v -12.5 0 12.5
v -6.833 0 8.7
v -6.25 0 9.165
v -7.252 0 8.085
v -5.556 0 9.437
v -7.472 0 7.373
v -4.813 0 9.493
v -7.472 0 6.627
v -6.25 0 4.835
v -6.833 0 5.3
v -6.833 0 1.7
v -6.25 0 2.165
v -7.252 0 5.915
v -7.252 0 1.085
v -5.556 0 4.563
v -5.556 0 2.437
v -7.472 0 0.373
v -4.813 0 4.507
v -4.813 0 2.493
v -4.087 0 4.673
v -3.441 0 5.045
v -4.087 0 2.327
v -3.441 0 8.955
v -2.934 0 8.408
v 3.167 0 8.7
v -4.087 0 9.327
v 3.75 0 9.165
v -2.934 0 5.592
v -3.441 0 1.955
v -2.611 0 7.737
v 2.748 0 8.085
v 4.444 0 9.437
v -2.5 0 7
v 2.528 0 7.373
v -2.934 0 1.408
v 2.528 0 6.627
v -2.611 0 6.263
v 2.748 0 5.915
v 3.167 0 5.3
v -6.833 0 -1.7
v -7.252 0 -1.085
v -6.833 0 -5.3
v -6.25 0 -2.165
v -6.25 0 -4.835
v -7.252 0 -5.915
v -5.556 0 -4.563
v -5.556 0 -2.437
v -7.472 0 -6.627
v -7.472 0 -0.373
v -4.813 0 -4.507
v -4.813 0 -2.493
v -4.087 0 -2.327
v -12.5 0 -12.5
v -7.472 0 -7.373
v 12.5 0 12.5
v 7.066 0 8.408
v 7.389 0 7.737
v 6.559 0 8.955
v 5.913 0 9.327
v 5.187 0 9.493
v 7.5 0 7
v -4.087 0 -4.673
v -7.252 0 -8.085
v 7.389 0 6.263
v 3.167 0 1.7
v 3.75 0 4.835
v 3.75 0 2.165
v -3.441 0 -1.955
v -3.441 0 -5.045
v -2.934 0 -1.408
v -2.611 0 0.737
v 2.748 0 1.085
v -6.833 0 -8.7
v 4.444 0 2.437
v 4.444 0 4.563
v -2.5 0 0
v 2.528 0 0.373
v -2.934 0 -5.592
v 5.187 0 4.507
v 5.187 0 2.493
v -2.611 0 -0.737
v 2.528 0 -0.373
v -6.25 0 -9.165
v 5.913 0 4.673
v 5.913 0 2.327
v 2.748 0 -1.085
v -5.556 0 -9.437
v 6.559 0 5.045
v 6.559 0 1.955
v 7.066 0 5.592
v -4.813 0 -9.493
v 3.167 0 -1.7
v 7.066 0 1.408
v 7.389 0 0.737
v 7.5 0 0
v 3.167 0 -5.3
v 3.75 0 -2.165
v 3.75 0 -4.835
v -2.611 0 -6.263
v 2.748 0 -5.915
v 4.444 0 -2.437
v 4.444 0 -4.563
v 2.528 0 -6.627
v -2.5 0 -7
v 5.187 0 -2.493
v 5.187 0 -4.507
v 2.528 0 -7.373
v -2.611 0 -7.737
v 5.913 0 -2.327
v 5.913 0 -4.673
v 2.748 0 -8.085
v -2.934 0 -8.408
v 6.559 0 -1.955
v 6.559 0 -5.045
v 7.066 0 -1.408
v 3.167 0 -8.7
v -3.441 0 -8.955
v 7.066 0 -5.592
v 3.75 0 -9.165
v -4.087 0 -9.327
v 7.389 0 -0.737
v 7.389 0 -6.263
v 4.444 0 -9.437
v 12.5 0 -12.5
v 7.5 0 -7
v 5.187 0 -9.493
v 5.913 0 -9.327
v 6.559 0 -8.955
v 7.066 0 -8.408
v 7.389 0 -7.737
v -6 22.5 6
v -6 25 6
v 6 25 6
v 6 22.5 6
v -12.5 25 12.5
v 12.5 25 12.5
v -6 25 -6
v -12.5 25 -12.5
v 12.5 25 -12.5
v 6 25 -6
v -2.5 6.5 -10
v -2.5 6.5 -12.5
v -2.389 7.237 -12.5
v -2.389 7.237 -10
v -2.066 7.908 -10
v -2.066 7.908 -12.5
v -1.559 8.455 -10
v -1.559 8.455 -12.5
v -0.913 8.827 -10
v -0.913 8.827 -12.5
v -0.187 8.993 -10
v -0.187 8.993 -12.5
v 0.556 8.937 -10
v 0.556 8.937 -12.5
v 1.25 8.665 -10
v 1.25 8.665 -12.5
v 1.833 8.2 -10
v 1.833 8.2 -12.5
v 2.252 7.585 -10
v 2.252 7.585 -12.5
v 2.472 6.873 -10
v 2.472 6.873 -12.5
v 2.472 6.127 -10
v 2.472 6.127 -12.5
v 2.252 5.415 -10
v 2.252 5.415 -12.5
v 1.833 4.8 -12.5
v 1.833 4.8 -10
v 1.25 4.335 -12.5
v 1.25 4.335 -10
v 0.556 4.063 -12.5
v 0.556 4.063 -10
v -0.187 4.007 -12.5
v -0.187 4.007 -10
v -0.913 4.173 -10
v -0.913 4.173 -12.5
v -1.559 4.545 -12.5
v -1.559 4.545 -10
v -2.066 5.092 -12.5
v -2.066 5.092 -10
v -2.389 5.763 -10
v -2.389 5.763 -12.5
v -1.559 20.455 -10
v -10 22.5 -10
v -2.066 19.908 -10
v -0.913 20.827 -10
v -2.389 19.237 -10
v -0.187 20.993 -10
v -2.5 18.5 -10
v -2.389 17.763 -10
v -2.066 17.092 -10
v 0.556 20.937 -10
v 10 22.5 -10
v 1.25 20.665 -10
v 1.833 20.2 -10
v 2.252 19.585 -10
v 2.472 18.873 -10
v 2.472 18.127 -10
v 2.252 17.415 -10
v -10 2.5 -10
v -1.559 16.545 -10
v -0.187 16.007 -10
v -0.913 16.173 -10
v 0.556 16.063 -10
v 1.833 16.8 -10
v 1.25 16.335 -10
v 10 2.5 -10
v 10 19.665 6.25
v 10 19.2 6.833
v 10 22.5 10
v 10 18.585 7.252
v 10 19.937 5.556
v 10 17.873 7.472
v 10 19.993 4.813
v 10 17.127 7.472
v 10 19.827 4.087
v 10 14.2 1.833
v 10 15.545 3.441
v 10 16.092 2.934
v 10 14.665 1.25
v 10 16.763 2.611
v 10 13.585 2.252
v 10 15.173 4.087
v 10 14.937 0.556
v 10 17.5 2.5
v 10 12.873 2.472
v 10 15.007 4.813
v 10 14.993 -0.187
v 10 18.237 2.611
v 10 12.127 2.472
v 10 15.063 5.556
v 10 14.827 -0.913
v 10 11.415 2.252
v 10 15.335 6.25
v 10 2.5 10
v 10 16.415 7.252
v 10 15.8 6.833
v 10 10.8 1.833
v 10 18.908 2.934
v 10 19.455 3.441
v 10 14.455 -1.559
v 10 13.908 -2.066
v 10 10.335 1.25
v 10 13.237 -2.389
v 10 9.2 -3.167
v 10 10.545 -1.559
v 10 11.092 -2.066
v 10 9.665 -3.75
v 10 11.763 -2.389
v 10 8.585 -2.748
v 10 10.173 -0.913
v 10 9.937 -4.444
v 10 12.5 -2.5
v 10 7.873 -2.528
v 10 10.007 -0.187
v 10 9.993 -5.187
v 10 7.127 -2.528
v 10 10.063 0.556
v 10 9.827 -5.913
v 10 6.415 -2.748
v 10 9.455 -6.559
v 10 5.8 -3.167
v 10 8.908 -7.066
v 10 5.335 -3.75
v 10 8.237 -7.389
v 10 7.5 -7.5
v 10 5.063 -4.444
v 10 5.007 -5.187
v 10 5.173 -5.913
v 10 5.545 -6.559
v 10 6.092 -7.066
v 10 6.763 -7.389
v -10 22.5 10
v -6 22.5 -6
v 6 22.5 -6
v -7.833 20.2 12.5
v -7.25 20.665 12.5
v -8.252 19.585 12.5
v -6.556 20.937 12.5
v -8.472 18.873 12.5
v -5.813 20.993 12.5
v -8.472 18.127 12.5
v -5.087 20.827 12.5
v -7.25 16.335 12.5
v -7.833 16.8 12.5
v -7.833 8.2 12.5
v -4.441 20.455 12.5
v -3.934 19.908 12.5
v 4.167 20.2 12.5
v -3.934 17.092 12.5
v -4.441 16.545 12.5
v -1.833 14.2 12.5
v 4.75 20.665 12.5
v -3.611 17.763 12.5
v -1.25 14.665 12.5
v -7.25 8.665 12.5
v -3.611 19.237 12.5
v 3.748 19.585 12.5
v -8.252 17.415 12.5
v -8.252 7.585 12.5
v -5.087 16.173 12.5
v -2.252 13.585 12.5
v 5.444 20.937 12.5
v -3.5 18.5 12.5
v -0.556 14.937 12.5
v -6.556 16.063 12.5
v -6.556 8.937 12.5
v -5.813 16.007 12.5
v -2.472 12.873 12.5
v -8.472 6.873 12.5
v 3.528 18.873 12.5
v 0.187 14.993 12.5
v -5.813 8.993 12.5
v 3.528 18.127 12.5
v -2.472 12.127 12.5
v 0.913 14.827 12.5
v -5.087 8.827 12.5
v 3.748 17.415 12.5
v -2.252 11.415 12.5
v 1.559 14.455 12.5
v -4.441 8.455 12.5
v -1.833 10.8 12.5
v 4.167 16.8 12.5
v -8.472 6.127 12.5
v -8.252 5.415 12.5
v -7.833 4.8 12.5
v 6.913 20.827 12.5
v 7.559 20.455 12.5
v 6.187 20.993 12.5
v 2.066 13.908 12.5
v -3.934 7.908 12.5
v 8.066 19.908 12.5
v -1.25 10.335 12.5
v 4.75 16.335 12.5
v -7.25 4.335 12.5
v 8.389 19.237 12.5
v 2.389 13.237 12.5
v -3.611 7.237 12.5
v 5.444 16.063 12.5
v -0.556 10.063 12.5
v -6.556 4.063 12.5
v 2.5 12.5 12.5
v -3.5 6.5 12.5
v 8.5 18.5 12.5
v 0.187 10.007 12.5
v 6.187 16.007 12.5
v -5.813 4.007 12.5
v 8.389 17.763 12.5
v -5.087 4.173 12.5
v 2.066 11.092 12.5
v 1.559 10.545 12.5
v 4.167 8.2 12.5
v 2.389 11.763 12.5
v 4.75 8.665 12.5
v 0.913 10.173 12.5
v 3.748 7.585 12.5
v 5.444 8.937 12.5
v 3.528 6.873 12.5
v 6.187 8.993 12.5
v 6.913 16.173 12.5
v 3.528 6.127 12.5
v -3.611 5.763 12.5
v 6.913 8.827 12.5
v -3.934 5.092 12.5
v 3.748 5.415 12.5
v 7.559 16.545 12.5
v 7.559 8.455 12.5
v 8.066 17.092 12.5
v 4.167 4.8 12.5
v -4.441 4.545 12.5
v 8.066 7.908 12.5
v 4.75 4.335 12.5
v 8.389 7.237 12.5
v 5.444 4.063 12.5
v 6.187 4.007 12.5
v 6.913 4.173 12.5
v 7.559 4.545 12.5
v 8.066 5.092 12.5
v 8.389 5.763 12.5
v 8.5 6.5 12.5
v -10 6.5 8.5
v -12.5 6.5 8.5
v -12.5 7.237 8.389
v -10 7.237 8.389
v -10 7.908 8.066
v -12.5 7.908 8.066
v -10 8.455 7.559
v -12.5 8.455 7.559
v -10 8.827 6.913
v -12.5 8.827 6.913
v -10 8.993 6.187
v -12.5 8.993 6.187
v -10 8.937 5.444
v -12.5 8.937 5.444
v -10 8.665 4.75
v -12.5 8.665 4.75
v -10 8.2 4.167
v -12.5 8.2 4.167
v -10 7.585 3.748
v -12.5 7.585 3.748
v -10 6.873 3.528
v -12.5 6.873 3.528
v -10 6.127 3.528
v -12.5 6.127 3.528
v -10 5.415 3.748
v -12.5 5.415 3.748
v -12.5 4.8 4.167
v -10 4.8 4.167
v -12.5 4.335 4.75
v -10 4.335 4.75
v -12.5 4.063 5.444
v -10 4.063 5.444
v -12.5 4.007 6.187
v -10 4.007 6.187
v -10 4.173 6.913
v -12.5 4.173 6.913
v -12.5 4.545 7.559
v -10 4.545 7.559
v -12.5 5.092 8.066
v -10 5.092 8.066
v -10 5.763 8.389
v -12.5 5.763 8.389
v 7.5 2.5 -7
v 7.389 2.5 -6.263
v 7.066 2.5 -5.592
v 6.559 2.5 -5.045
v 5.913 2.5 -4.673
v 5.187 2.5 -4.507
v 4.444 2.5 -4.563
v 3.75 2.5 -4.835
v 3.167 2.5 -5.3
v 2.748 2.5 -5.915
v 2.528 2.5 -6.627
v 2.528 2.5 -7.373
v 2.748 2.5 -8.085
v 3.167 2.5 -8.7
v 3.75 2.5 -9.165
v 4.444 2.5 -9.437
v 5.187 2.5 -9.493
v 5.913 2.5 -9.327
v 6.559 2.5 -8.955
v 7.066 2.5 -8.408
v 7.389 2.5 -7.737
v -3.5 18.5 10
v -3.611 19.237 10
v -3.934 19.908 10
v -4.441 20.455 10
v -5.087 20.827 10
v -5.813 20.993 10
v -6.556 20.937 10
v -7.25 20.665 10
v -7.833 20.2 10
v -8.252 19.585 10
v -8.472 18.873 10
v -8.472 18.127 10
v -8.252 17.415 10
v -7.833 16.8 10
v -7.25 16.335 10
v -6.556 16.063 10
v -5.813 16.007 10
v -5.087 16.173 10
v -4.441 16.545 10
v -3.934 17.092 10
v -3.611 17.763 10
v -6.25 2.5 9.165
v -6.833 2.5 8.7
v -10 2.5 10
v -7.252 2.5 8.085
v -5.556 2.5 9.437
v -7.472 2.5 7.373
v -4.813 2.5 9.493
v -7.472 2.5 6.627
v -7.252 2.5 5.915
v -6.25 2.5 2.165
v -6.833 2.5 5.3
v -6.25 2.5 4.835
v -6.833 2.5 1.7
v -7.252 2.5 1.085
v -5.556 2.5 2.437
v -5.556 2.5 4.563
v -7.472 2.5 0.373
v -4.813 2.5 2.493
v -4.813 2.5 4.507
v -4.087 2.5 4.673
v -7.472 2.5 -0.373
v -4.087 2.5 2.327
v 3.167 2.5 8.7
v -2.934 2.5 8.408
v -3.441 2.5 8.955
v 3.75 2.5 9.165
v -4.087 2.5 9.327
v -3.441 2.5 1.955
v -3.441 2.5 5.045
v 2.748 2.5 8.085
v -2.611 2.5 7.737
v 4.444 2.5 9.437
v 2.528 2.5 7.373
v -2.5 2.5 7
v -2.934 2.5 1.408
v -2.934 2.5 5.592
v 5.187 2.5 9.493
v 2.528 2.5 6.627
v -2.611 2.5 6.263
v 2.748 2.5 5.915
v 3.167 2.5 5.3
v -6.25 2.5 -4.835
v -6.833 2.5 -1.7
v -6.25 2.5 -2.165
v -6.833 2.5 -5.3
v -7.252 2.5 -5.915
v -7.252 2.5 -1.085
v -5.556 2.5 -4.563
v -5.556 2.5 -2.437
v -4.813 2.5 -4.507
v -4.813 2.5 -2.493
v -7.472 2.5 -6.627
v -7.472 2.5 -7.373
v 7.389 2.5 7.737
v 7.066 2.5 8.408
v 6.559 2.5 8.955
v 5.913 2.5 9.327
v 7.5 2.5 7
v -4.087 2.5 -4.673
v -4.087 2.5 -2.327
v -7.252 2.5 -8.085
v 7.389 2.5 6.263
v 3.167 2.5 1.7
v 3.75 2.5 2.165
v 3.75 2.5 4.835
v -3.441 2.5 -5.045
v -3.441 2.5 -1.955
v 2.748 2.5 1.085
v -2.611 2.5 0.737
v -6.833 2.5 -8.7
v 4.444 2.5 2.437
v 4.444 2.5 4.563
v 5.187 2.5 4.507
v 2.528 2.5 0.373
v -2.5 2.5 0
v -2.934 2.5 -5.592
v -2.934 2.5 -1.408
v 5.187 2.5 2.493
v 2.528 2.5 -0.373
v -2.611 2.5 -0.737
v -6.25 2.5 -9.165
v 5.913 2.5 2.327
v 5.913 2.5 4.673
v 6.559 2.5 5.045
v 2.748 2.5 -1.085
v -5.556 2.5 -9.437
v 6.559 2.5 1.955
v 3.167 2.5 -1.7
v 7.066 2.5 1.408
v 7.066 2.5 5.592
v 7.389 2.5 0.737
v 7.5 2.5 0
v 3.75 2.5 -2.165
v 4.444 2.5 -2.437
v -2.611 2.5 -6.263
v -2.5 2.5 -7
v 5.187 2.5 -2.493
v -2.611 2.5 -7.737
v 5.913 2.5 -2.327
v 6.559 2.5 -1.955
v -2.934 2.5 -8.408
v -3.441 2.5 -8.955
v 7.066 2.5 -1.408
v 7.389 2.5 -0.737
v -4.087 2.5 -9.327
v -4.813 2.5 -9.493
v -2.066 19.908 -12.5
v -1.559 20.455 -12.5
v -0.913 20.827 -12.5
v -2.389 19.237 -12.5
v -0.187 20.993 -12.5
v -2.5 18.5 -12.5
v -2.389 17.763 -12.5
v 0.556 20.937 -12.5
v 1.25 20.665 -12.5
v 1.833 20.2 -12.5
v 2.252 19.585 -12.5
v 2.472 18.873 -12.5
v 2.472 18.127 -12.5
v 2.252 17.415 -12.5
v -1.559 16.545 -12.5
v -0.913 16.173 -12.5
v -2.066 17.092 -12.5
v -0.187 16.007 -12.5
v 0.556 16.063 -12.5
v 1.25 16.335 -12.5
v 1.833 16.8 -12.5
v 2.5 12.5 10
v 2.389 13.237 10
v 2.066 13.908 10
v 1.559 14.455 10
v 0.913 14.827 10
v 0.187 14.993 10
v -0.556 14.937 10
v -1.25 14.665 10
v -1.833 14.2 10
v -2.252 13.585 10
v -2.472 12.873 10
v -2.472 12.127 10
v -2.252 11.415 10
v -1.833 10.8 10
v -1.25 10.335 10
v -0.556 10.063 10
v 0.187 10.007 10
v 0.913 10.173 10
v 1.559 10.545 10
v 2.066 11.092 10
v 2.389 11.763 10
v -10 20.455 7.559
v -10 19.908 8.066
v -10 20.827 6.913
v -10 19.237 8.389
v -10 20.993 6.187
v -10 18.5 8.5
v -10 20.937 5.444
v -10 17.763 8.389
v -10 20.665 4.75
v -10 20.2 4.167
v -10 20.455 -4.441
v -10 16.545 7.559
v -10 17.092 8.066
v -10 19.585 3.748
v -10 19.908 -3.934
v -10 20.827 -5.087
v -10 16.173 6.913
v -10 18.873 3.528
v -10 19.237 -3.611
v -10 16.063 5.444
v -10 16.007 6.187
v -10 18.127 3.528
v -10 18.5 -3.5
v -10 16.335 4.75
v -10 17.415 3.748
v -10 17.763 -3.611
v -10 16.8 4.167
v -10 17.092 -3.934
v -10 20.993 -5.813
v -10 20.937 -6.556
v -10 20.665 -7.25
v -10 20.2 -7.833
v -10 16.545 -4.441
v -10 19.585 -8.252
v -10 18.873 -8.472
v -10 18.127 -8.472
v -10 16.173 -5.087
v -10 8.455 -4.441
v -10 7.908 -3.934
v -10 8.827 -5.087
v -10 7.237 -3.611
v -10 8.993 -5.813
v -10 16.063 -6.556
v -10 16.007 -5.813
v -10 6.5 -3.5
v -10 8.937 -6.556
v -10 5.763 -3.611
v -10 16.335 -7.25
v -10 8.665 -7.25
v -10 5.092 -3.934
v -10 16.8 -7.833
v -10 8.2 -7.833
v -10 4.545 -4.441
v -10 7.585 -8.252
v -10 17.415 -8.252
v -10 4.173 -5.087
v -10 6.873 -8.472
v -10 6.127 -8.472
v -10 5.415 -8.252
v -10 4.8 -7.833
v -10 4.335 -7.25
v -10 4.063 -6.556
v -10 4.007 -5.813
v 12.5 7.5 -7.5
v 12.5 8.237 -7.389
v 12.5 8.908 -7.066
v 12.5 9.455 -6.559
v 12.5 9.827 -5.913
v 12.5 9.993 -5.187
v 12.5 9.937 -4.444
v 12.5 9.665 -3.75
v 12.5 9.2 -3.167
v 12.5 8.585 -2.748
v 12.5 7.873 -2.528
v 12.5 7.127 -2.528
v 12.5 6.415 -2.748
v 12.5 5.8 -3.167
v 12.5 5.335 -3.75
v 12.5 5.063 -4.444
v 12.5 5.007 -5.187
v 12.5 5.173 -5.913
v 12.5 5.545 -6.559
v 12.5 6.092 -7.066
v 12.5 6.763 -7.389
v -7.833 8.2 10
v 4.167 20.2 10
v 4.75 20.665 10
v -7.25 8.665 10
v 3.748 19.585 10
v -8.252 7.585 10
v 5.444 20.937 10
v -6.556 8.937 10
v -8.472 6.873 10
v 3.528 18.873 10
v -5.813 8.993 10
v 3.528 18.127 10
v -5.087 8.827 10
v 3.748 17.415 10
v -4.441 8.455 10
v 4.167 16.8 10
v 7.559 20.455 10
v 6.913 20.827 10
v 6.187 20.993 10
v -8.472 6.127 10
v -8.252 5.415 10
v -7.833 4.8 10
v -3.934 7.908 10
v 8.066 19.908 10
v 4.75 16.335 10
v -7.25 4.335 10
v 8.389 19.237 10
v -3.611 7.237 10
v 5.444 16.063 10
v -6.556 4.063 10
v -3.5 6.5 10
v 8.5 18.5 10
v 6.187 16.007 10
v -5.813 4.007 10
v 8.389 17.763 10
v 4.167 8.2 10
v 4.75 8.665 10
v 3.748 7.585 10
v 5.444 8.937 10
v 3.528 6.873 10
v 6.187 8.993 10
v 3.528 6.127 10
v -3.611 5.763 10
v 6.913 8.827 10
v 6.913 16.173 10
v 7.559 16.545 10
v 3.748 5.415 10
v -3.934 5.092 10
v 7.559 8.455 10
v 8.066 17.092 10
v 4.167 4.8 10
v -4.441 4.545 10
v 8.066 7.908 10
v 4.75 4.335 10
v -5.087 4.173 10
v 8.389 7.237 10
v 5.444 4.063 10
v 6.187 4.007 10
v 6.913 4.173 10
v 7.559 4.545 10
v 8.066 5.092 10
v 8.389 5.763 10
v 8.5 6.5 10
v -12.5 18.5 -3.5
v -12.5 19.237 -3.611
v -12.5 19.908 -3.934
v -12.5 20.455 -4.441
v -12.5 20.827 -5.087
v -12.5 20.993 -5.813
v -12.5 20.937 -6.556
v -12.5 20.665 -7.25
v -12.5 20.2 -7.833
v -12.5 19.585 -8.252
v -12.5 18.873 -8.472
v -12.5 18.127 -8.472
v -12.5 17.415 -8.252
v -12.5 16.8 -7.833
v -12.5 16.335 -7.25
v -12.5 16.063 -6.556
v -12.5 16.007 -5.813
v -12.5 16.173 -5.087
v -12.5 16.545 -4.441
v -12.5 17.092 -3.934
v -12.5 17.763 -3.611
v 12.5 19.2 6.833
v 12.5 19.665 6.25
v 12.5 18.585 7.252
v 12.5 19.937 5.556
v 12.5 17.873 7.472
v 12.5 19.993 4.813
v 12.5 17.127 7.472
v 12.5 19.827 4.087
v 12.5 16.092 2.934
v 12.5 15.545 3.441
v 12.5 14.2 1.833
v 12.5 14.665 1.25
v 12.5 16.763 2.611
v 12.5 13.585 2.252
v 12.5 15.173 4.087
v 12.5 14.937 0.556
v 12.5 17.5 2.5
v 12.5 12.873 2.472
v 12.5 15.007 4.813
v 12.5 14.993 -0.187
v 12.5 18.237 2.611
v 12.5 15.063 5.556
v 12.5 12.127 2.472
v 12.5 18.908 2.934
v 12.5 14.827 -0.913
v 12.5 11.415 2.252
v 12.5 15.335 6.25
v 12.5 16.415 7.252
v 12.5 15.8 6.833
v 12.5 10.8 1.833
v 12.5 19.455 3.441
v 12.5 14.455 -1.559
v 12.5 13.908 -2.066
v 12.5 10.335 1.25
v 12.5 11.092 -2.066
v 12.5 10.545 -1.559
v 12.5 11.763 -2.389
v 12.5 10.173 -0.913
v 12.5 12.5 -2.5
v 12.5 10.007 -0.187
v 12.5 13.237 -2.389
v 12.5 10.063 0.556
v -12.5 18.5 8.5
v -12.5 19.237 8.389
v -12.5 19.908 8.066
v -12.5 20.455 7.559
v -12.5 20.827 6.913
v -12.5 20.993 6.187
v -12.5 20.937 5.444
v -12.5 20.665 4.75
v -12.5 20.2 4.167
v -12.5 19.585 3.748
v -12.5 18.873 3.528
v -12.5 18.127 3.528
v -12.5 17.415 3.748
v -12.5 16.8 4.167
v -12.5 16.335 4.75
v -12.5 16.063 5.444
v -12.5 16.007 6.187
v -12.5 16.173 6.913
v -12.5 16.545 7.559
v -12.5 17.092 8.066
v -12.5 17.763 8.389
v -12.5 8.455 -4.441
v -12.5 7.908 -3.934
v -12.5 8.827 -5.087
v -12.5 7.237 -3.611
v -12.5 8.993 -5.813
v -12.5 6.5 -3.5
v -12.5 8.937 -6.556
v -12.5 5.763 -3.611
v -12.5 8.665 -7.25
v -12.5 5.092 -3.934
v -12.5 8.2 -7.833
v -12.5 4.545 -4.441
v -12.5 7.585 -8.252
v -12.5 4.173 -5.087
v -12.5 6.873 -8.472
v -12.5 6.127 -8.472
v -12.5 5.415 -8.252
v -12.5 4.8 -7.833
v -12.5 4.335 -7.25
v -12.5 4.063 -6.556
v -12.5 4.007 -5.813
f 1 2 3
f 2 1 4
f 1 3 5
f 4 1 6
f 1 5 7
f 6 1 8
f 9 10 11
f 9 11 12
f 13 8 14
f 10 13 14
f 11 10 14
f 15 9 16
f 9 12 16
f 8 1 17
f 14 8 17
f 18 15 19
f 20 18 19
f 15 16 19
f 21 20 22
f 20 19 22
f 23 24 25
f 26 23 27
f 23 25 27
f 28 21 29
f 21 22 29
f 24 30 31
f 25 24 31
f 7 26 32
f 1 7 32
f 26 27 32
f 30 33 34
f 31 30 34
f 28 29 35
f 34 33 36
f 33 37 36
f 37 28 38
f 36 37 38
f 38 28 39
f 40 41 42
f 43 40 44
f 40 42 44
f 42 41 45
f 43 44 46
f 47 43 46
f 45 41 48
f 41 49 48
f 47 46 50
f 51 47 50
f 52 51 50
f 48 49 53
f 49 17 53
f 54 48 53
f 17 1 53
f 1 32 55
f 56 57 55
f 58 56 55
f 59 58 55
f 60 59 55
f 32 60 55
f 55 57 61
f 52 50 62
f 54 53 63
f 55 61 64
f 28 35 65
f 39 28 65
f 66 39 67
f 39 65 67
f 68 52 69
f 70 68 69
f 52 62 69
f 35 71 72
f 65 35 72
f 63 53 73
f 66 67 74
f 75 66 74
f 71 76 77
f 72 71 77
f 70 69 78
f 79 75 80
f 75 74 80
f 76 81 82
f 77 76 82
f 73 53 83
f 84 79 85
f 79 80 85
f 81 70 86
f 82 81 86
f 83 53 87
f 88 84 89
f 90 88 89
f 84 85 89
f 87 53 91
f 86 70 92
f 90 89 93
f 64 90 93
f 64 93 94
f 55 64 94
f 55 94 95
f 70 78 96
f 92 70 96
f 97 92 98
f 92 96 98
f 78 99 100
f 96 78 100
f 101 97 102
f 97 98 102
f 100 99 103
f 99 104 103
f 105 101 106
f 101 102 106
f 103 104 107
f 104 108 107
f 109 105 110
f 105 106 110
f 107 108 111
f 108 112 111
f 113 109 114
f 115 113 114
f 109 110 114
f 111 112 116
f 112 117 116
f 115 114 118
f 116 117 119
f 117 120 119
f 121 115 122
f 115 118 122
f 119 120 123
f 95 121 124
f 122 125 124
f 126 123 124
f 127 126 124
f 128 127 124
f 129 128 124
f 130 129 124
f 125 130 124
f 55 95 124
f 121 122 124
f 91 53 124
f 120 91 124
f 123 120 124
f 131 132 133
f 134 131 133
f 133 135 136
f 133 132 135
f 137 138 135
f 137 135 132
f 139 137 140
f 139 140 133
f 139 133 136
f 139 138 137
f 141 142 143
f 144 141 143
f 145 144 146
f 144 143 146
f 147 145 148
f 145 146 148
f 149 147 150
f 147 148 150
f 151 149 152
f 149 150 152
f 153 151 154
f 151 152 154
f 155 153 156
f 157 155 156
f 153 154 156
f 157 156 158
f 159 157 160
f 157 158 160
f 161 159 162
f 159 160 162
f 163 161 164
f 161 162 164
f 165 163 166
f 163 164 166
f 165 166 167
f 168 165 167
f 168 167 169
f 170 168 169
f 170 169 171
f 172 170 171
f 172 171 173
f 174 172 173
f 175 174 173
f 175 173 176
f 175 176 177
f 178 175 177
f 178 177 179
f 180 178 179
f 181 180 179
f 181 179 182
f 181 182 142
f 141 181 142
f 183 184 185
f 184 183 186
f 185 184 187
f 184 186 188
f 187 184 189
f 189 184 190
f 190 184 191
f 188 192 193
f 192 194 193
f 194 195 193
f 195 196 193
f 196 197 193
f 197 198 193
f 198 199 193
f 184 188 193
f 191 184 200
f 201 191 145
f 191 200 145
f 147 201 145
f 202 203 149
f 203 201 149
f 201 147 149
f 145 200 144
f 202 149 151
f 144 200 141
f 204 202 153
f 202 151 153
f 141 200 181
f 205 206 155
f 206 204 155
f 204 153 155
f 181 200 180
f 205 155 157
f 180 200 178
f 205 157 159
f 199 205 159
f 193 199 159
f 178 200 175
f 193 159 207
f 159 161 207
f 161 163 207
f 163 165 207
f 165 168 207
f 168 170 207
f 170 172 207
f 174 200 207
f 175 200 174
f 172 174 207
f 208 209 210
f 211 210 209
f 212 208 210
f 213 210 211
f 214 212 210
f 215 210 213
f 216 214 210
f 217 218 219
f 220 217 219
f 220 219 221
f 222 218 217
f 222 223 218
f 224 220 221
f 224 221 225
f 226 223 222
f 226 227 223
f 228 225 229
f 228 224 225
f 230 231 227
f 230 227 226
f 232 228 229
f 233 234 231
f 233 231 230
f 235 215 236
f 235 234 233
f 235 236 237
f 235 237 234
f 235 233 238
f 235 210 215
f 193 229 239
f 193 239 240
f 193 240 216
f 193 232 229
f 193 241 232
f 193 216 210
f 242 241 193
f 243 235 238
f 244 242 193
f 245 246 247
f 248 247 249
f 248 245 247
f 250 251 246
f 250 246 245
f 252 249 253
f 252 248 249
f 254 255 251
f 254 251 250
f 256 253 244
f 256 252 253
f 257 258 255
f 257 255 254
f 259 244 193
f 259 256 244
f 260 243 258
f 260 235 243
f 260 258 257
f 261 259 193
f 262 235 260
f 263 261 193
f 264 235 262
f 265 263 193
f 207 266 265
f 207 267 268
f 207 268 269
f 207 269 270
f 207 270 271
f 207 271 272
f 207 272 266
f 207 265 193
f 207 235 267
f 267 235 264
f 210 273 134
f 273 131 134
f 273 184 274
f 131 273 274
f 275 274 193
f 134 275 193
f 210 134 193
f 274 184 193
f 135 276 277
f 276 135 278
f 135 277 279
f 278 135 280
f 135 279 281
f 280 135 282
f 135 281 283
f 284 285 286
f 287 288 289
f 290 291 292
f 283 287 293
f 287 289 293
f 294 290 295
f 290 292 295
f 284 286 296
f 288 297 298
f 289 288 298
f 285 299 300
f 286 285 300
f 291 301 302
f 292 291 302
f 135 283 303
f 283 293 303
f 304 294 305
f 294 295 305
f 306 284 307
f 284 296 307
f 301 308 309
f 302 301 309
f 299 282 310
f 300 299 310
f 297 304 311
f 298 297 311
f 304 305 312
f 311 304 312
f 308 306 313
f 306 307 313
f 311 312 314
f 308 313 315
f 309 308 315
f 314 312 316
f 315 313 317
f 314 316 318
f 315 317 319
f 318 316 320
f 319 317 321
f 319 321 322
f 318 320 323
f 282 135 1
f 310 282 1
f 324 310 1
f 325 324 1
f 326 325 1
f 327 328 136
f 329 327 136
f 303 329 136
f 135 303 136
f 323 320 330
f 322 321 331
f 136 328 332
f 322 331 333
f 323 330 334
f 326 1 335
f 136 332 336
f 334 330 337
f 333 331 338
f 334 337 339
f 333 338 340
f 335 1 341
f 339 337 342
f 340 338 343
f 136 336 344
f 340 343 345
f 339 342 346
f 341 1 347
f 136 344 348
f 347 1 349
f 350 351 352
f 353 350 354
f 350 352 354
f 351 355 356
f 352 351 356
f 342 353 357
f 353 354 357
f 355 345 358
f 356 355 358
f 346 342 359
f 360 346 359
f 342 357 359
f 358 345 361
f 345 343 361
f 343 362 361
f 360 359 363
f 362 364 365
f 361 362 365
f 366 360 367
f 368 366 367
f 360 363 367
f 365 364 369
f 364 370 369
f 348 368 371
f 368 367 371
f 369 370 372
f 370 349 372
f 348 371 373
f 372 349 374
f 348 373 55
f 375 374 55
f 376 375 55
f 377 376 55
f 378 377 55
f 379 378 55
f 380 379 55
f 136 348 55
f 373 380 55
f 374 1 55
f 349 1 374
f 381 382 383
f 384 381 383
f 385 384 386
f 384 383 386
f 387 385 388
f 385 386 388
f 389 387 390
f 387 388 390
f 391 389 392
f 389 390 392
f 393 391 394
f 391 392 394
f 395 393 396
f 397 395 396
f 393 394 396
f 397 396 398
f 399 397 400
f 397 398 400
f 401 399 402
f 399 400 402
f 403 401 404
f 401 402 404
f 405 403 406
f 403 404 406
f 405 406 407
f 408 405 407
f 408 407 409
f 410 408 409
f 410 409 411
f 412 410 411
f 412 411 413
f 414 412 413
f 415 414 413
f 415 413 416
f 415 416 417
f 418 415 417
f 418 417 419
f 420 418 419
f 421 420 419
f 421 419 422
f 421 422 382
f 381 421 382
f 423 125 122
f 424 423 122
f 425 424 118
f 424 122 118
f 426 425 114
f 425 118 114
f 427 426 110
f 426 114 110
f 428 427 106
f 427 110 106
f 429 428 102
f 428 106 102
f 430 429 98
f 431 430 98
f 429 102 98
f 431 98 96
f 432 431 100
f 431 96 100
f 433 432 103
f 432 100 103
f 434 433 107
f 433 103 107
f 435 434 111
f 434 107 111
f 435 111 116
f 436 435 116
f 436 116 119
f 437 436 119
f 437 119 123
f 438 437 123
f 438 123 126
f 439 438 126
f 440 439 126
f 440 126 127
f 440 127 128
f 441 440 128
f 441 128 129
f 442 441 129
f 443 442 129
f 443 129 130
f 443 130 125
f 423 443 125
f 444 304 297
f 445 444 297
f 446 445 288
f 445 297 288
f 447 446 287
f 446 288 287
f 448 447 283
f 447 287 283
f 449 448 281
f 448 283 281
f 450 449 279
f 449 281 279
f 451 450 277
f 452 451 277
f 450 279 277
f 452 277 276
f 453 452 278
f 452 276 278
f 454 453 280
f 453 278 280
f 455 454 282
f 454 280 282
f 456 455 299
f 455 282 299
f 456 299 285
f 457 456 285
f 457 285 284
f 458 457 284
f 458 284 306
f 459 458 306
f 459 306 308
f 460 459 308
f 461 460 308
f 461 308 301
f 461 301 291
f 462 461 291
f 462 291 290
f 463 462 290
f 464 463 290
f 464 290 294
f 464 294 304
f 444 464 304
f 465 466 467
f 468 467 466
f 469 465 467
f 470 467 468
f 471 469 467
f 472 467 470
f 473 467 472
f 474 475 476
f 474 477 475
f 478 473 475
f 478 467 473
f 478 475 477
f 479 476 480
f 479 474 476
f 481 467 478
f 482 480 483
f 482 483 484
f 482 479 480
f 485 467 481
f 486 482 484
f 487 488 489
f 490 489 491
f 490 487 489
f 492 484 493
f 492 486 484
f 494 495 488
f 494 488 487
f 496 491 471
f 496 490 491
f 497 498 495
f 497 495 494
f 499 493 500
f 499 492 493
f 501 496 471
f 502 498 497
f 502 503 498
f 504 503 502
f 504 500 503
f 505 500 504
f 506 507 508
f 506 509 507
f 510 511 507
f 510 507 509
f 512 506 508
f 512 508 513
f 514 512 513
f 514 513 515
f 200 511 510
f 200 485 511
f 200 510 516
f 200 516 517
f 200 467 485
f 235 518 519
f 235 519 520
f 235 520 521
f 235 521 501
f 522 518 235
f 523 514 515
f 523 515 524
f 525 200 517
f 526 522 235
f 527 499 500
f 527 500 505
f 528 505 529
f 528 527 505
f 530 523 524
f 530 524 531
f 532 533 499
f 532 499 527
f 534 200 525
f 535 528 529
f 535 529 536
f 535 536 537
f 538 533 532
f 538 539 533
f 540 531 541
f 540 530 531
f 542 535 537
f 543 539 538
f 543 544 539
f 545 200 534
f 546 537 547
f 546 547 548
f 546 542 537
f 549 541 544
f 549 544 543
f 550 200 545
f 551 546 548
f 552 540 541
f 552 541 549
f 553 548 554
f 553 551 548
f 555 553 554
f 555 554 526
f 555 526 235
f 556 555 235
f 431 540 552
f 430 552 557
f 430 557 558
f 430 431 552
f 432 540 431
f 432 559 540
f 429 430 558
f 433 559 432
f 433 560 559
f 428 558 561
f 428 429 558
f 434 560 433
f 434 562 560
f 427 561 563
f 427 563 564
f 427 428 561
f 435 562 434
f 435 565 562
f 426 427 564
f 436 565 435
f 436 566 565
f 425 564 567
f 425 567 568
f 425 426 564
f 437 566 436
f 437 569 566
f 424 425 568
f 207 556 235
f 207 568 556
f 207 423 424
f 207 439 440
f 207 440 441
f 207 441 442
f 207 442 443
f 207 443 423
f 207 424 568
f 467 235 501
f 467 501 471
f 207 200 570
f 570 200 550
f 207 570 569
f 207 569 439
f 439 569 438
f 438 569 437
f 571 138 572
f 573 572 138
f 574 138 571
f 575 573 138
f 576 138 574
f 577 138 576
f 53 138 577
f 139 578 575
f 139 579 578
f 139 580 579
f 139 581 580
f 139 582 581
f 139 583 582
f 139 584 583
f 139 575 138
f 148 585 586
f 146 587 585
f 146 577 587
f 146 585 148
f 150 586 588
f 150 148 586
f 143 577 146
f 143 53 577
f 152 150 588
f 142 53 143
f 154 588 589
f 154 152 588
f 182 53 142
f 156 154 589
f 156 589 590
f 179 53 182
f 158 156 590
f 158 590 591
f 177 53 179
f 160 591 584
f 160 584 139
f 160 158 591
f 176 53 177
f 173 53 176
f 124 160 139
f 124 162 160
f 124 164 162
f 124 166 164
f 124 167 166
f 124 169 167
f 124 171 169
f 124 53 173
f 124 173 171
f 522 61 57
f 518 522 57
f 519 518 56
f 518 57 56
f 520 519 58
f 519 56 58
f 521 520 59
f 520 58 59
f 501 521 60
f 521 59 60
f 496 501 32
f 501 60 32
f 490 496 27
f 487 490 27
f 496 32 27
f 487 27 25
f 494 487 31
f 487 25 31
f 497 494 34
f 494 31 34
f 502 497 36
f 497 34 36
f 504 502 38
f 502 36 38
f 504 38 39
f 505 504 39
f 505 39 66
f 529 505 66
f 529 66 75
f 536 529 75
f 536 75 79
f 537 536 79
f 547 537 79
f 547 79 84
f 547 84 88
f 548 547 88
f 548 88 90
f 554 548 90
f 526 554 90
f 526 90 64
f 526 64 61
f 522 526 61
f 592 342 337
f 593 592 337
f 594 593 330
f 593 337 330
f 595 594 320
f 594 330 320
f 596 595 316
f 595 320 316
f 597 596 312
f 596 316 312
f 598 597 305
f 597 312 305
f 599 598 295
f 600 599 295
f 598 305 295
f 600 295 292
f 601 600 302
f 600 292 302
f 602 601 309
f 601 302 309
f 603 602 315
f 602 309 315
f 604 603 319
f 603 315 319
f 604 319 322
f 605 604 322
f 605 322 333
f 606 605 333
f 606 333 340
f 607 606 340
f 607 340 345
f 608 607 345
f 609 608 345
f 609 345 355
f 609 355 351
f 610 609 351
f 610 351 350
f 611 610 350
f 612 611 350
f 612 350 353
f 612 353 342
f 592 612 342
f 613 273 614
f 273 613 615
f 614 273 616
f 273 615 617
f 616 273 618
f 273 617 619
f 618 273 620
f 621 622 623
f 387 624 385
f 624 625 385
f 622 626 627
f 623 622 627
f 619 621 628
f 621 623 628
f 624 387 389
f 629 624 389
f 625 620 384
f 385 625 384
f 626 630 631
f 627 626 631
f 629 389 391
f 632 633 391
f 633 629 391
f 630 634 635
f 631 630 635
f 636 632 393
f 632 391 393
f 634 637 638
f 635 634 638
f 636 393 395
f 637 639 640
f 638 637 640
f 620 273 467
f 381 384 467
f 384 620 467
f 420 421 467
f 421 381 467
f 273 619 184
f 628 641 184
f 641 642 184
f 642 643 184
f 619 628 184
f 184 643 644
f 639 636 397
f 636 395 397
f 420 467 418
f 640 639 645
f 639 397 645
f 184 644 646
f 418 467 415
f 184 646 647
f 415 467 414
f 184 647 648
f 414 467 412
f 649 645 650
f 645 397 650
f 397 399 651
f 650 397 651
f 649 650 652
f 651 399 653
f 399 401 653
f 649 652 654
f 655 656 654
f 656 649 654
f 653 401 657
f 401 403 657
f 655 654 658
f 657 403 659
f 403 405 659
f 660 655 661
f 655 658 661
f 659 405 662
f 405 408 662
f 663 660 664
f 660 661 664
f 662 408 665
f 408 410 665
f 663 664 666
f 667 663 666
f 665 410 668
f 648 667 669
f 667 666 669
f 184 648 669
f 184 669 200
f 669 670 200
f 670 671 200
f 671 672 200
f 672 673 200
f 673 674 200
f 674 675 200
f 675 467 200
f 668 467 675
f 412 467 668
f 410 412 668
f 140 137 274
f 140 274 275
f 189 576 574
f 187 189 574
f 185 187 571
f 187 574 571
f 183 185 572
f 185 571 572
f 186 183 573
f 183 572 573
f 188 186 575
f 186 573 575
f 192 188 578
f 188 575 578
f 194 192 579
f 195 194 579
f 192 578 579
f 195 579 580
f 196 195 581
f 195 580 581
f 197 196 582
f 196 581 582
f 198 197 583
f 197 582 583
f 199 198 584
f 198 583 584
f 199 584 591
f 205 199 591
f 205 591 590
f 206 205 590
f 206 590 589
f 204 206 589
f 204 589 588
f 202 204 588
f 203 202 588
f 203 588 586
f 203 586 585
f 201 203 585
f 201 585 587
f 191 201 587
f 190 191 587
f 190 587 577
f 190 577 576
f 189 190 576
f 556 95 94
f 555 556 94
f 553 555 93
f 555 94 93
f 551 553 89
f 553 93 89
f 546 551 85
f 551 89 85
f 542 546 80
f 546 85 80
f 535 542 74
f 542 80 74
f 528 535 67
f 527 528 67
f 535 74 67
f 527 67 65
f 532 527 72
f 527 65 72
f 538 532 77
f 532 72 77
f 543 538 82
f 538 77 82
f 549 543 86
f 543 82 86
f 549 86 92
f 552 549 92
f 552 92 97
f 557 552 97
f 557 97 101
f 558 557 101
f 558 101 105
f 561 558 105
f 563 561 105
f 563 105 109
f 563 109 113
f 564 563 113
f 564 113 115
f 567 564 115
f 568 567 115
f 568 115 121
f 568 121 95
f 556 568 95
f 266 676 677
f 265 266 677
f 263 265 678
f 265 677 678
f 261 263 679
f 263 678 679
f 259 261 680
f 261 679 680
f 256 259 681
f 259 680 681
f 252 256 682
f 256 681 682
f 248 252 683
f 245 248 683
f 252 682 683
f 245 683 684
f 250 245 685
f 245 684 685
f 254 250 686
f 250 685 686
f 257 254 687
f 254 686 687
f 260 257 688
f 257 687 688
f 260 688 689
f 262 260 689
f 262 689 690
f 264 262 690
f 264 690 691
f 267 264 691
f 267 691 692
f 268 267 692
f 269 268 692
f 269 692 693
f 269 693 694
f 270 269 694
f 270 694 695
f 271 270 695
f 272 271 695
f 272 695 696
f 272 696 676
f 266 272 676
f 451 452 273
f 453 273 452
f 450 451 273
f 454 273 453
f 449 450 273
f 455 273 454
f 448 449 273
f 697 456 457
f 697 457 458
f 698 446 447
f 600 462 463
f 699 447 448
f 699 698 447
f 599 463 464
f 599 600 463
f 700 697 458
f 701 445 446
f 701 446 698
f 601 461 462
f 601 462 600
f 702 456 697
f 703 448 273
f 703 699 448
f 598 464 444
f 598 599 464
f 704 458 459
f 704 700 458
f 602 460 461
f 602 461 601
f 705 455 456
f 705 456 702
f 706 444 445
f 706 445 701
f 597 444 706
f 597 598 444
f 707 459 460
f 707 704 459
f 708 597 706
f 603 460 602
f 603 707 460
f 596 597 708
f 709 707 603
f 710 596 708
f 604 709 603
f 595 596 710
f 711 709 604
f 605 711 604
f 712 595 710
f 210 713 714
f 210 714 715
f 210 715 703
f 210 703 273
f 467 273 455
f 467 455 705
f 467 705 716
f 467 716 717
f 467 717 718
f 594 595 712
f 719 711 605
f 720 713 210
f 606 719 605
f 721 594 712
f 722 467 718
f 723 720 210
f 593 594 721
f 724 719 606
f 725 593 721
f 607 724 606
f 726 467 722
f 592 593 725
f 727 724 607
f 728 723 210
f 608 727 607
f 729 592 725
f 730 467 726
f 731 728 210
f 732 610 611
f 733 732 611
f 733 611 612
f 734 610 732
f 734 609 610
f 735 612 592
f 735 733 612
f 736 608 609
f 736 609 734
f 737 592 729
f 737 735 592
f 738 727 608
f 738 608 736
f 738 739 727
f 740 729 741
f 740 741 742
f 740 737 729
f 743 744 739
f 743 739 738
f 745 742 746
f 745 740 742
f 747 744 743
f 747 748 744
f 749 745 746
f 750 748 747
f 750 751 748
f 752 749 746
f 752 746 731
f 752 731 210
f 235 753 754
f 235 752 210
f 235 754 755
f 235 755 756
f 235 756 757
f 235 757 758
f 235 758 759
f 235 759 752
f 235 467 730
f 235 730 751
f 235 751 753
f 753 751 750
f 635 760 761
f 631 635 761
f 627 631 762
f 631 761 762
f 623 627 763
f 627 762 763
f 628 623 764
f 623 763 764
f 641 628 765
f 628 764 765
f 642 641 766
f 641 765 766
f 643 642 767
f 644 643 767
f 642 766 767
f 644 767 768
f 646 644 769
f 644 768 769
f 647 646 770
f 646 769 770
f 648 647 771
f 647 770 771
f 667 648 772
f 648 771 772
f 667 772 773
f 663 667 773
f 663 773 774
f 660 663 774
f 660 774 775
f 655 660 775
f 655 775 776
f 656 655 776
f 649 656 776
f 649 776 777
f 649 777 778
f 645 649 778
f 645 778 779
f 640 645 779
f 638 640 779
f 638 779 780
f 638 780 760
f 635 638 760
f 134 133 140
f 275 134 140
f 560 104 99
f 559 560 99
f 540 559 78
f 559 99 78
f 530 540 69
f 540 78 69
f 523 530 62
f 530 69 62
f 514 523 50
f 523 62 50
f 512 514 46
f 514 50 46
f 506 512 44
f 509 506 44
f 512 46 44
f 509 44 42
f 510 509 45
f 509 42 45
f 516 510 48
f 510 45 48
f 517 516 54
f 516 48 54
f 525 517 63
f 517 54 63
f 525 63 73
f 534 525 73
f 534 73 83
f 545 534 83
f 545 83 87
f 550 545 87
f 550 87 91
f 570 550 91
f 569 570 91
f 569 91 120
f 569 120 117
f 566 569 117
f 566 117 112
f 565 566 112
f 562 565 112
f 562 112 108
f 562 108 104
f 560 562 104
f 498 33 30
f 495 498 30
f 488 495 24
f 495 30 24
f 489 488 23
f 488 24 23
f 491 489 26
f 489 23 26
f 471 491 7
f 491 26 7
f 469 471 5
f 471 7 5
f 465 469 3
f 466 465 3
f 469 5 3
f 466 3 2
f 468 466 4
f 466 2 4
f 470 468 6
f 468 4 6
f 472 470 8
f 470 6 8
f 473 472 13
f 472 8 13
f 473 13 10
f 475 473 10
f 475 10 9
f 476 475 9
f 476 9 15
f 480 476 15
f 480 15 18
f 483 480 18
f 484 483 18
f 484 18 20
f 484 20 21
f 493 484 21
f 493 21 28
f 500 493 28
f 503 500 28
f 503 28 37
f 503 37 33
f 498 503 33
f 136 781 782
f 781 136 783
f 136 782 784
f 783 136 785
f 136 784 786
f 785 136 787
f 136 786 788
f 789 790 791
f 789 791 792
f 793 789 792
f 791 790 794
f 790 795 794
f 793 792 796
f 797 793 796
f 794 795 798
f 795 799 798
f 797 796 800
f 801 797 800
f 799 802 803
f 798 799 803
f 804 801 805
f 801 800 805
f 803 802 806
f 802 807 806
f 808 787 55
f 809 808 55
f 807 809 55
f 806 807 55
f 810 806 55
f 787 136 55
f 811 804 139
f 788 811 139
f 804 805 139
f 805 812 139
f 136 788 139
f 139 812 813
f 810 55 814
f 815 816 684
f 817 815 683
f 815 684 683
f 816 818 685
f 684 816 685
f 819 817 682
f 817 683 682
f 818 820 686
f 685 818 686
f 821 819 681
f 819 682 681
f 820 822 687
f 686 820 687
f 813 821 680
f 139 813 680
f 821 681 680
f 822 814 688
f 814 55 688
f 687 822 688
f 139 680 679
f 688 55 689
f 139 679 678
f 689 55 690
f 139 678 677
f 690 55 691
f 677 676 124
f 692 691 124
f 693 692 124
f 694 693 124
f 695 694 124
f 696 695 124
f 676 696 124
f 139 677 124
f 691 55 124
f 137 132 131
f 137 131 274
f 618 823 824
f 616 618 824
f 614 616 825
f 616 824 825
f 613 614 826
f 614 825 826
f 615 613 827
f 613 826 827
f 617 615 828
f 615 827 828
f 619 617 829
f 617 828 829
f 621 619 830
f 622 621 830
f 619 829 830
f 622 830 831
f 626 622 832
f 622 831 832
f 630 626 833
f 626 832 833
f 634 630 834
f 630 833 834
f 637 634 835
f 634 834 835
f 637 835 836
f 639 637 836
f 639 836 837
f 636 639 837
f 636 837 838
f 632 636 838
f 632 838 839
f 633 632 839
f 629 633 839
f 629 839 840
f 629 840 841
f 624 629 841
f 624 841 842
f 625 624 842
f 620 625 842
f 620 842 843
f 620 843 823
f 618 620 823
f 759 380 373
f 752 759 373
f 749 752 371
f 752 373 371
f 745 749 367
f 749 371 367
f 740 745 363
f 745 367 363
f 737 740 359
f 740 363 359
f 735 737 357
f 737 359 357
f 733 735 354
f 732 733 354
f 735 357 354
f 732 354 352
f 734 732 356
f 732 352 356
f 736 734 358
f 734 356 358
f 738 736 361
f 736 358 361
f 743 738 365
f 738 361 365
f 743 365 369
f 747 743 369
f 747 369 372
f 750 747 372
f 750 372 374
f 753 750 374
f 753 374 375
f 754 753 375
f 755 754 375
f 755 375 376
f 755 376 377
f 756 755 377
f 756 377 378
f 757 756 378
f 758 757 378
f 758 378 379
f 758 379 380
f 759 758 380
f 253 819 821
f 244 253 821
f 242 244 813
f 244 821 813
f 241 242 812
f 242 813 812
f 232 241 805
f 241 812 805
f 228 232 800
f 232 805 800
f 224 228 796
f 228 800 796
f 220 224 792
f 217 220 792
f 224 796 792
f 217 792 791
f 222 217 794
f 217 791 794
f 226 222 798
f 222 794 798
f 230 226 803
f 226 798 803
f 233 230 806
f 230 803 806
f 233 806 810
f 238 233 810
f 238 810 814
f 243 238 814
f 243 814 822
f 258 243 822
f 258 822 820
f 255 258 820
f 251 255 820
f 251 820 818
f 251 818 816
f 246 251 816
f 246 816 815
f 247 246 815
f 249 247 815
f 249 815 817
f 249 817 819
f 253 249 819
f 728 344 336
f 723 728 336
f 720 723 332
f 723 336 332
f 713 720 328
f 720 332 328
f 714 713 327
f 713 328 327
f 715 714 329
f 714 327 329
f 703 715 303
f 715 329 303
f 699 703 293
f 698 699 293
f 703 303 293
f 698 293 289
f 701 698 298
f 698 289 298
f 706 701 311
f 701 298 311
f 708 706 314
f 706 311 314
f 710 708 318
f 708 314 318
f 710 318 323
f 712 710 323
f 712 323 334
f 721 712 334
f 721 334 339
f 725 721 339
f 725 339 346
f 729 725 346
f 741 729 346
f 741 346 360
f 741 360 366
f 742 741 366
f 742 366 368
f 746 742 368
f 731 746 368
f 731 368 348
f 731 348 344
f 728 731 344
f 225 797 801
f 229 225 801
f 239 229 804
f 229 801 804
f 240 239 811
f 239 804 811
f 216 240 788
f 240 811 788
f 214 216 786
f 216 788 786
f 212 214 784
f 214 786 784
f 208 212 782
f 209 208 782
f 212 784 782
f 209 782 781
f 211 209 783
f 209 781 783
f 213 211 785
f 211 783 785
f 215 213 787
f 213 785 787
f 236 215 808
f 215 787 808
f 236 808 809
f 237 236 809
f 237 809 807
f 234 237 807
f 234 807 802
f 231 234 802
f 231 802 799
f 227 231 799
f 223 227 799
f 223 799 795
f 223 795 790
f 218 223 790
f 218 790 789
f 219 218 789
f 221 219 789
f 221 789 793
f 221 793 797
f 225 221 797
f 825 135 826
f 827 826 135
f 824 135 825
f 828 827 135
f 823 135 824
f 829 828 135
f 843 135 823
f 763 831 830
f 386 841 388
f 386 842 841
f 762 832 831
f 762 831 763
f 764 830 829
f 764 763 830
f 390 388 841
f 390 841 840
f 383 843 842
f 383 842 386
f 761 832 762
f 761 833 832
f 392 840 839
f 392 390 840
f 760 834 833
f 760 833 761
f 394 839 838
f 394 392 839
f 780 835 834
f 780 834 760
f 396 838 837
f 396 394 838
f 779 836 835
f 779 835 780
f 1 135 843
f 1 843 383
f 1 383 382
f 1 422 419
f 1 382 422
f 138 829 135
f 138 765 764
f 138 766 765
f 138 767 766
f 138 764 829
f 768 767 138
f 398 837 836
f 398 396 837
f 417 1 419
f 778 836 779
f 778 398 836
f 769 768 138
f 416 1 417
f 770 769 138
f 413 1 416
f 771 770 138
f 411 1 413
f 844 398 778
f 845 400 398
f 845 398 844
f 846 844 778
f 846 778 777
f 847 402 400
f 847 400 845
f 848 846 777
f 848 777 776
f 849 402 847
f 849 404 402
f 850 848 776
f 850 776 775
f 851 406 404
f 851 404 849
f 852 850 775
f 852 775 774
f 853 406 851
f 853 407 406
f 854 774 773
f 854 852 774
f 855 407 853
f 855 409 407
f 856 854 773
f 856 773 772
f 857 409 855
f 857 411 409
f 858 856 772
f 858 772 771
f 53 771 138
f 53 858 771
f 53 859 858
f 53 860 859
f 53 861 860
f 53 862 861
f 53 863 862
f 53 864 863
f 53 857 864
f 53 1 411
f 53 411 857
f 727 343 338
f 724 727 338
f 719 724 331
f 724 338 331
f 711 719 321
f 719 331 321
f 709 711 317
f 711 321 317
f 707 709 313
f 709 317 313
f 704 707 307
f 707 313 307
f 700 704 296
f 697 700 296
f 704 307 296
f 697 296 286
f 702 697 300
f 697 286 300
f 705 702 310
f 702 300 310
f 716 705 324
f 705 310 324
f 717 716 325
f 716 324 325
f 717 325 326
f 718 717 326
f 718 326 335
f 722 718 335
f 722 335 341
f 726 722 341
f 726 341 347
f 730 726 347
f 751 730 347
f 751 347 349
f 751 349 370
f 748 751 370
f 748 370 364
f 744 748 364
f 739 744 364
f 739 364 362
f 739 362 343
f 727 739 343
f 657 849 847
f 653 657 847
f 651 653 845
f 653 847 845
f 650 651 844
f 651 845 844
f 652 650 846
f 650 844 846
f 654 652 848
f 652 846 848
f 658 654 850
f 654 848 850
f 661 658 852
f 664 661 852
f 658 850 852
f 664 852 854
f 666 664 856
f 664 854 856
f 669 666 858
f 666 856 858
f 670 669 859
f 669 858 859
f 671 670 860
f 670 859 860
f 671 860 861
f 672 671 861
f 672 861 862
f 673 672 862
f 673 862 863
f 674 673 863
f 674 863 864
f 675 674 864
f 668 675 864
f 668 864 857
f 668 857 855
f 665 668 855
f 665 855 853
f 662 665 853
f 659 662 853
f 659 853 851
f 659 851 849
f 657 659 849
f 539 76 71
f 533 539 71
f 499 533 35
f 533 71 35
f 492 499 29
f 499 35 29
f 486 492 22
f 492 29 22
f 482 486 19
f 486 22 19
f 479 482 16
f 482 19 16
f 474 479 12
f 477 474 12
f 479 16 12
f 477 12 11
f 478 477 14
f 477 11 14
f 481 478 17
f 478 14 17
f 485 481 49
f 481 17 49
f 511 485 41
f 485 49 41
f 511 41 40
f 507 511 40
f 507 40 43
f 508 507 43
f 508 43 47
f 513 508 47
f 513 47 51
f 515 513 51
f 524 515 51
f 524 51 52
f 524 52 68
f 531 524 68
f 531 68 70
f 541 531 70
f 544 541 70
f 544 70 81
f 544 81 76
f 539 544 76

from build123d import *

# Parameters (mm, degrees)
SKETCH1_W           = 25
SKETCH1_H           = 25
BOSS_EXTRUDE1_DEPTH = 25
SHELL1_T            = 2.5
SKETCH2_W           = 12
SKETCH2_H           = 12
CUT_EXTRUDE1_DEPTH  = 15
SKETCH3_R           = 2.5
CUT_EXTRUDE2_DEPTH  = 15
SKETCH4_R           = 2.5
CUT_EXTRUDE6_DEPTH  = 15
SKETCH4_3_R         = 2.5
CUT_EXTRUDE7_DEPTH  = 15
SKETCH5_R           = 2.5
CUT_EXTRUDE8_DEPTH  = 15
SKETCH5_4_R         = 2.5
CUT_EXTRUDE9_DEPTH  = 15
SKETCH5_5_R         = 2.5
CUT_EXTRUDE10_DEPTH = 15
SKETCH7_R           = 2.5
CUT_EXTRUDE11_DEPTH = 15
SKETCH8_R           = 2.5
CUT_EXTRUDE12_DEPTH = 10


with BuildPart() as part:
    # Sketch1 → Boss-Extrude1 (new body)
    with BuildSketch(Plane(origin=(0, 0, 0), x_dir=(1, 0, 0), z_dir=(0, 1, 0))):
        Rectangle(SKETCH1_W, SKETCH1_H)
    extrude(amount=BOSS_EXTRUDE1_DEPTH)

    # Shell1 (no face opened: a closed hollow body)
    add(offset(amount=-SHELL1_T, mode=Mode.PRIVATE), mode=Mode.SUBTRACT)

    # Sketch2 → Cut-Extrude1 (cut)
    with BuildSketch(Plane(origin=(0, 25, 0), x_dir=(1, 0, 0), z_dir=(0, 1, 0))):
        Rectangle(SKETCH2_W, SKETCH2_H)
    extrude(amount=-CUT_EXTRUDE1_DEPTH, mode=Mode.SUBTRACT)

    # Sketch3 → Cut-Extrude2 (cut)
    with BuildSketch(Plane.XZ):
        with Locations((-5, 7)):
            Circle(SKETCH3_R)
        with Locations((-5, 0)):
            Circle(SKETCH3_R)
        with Locations((-5, -7)):
            Circle(SKETCH3_R)
        with Locations((5, 7)):
            Circle(SKETCH3_R)
        with Locations((5, 0)):
            Circle(SKETCH3_R)
        with Locations((5, -7)):
            Circle(SKETCH3_R)
    extrude(amount=-CUT_EXTRUDE2_DEPTH, mode=Mode.SUBTRACT)

    # Sketch4 → Cut-Extrude6 (cut)
    with BuildSketch(Plane(origin=(12.5, 0, 0), x_dir=(0, 0, -1), z_dir=(1, 0, 0))):
        with Locations((-5, 17.5)):
            Circle(SKETCH4_R)
    extrude(amount=-CUT_EXTRUDE6_DEPTH, mode=Mode.SUBTRACT)

    # Sketch4<3> → Cut-Extrude7 (cut)
    with BuildSketch(Plane(origin=(12.5, 0, 0), x_dir=(0, 0, -1), z_dir=(1, 0, 0))):
        with Locations((0, 12.5)):
            Circle(SKETCH4_3_R)
        with Locations((5, 7.5)):
            Circle(SKETCH4_3_R)
    extrude(amount=-CUT_EXTRUDE7_DEPTH, mode=Mode.SUBTRACT)

    # Sketch5 → Cut-Extrude8 (cut)
    with BuildSketch(Plane.ZY.offset(12.5)):
        with Locations((-6, 18.5)):
            Circle(SKETCH5_R)
    extrude(amount=-CUT_EXTRUDE8_DEPTH, mode=Mode.SUBTRACT)

    # Sketch5<4> → Cut-Extrude9 (cut)
    with BuildSketch(Plane.ZY.offset(12.5)):
        with Locations((6, 18.5)):
            Circle(SKETCH5_4_R)
    extrude(amount=-CUT_EXTRUDE9_DEPTH, mode=Mode.SUBTRACT)

    # Sketch5<5> → Cut-Extrude10 (cut)
    with BuildSketch(Plane.ZY.offset(12.5)):
        with Locations((6, 6.5)):
            Circle(SKETCH5_5_R)
        with Locations((-6, 6.5)):
            Circle(SKETCH5_5_R)
    extrude(amount=-CUT_EXTRUDE10_DEPTH, mode=Mode.SUBTRACT)

    # Sketch7 → Cut-Extrude11 (cut)
    with BuildSketch(Plane.XY.offset(12.5)):
        with Locations((-6, 18.5)):
            Circle(SKETCH7_R)
        with Locations((0, 12.5)):
            Circle(SKETCH7_R)
        with Locations((6, 18.5)):
            Circle(SKETCH7_R)
        with Locations((6, 6.5)):
            Circle(SKETCH7_R)
        with Locations((-6, 6.5)):
            Circle(SKETCH7_R)
    extrude(amount=-CUT_EXTRUDE11_DEPTH, mode=Mode.SUBTRACT)

    # Sketch8 → Cut-Extrude12 (cut)
    with BuildSketch(Plane(origin=(0, 0, -12.5), x_dir=(-1, 0, 0), z_dir=(0, 0, -1))):
        with Locations((0, 18.5)):
            Circle(SKETCH8_R)
        with Locations((0, 6.5)):
            Circle(SKETCH8_R)
    extrude(amount=-CUT_EXTRUDE12_DEPTH, mode=Mode.SUBTRACT)


solid = part.part
